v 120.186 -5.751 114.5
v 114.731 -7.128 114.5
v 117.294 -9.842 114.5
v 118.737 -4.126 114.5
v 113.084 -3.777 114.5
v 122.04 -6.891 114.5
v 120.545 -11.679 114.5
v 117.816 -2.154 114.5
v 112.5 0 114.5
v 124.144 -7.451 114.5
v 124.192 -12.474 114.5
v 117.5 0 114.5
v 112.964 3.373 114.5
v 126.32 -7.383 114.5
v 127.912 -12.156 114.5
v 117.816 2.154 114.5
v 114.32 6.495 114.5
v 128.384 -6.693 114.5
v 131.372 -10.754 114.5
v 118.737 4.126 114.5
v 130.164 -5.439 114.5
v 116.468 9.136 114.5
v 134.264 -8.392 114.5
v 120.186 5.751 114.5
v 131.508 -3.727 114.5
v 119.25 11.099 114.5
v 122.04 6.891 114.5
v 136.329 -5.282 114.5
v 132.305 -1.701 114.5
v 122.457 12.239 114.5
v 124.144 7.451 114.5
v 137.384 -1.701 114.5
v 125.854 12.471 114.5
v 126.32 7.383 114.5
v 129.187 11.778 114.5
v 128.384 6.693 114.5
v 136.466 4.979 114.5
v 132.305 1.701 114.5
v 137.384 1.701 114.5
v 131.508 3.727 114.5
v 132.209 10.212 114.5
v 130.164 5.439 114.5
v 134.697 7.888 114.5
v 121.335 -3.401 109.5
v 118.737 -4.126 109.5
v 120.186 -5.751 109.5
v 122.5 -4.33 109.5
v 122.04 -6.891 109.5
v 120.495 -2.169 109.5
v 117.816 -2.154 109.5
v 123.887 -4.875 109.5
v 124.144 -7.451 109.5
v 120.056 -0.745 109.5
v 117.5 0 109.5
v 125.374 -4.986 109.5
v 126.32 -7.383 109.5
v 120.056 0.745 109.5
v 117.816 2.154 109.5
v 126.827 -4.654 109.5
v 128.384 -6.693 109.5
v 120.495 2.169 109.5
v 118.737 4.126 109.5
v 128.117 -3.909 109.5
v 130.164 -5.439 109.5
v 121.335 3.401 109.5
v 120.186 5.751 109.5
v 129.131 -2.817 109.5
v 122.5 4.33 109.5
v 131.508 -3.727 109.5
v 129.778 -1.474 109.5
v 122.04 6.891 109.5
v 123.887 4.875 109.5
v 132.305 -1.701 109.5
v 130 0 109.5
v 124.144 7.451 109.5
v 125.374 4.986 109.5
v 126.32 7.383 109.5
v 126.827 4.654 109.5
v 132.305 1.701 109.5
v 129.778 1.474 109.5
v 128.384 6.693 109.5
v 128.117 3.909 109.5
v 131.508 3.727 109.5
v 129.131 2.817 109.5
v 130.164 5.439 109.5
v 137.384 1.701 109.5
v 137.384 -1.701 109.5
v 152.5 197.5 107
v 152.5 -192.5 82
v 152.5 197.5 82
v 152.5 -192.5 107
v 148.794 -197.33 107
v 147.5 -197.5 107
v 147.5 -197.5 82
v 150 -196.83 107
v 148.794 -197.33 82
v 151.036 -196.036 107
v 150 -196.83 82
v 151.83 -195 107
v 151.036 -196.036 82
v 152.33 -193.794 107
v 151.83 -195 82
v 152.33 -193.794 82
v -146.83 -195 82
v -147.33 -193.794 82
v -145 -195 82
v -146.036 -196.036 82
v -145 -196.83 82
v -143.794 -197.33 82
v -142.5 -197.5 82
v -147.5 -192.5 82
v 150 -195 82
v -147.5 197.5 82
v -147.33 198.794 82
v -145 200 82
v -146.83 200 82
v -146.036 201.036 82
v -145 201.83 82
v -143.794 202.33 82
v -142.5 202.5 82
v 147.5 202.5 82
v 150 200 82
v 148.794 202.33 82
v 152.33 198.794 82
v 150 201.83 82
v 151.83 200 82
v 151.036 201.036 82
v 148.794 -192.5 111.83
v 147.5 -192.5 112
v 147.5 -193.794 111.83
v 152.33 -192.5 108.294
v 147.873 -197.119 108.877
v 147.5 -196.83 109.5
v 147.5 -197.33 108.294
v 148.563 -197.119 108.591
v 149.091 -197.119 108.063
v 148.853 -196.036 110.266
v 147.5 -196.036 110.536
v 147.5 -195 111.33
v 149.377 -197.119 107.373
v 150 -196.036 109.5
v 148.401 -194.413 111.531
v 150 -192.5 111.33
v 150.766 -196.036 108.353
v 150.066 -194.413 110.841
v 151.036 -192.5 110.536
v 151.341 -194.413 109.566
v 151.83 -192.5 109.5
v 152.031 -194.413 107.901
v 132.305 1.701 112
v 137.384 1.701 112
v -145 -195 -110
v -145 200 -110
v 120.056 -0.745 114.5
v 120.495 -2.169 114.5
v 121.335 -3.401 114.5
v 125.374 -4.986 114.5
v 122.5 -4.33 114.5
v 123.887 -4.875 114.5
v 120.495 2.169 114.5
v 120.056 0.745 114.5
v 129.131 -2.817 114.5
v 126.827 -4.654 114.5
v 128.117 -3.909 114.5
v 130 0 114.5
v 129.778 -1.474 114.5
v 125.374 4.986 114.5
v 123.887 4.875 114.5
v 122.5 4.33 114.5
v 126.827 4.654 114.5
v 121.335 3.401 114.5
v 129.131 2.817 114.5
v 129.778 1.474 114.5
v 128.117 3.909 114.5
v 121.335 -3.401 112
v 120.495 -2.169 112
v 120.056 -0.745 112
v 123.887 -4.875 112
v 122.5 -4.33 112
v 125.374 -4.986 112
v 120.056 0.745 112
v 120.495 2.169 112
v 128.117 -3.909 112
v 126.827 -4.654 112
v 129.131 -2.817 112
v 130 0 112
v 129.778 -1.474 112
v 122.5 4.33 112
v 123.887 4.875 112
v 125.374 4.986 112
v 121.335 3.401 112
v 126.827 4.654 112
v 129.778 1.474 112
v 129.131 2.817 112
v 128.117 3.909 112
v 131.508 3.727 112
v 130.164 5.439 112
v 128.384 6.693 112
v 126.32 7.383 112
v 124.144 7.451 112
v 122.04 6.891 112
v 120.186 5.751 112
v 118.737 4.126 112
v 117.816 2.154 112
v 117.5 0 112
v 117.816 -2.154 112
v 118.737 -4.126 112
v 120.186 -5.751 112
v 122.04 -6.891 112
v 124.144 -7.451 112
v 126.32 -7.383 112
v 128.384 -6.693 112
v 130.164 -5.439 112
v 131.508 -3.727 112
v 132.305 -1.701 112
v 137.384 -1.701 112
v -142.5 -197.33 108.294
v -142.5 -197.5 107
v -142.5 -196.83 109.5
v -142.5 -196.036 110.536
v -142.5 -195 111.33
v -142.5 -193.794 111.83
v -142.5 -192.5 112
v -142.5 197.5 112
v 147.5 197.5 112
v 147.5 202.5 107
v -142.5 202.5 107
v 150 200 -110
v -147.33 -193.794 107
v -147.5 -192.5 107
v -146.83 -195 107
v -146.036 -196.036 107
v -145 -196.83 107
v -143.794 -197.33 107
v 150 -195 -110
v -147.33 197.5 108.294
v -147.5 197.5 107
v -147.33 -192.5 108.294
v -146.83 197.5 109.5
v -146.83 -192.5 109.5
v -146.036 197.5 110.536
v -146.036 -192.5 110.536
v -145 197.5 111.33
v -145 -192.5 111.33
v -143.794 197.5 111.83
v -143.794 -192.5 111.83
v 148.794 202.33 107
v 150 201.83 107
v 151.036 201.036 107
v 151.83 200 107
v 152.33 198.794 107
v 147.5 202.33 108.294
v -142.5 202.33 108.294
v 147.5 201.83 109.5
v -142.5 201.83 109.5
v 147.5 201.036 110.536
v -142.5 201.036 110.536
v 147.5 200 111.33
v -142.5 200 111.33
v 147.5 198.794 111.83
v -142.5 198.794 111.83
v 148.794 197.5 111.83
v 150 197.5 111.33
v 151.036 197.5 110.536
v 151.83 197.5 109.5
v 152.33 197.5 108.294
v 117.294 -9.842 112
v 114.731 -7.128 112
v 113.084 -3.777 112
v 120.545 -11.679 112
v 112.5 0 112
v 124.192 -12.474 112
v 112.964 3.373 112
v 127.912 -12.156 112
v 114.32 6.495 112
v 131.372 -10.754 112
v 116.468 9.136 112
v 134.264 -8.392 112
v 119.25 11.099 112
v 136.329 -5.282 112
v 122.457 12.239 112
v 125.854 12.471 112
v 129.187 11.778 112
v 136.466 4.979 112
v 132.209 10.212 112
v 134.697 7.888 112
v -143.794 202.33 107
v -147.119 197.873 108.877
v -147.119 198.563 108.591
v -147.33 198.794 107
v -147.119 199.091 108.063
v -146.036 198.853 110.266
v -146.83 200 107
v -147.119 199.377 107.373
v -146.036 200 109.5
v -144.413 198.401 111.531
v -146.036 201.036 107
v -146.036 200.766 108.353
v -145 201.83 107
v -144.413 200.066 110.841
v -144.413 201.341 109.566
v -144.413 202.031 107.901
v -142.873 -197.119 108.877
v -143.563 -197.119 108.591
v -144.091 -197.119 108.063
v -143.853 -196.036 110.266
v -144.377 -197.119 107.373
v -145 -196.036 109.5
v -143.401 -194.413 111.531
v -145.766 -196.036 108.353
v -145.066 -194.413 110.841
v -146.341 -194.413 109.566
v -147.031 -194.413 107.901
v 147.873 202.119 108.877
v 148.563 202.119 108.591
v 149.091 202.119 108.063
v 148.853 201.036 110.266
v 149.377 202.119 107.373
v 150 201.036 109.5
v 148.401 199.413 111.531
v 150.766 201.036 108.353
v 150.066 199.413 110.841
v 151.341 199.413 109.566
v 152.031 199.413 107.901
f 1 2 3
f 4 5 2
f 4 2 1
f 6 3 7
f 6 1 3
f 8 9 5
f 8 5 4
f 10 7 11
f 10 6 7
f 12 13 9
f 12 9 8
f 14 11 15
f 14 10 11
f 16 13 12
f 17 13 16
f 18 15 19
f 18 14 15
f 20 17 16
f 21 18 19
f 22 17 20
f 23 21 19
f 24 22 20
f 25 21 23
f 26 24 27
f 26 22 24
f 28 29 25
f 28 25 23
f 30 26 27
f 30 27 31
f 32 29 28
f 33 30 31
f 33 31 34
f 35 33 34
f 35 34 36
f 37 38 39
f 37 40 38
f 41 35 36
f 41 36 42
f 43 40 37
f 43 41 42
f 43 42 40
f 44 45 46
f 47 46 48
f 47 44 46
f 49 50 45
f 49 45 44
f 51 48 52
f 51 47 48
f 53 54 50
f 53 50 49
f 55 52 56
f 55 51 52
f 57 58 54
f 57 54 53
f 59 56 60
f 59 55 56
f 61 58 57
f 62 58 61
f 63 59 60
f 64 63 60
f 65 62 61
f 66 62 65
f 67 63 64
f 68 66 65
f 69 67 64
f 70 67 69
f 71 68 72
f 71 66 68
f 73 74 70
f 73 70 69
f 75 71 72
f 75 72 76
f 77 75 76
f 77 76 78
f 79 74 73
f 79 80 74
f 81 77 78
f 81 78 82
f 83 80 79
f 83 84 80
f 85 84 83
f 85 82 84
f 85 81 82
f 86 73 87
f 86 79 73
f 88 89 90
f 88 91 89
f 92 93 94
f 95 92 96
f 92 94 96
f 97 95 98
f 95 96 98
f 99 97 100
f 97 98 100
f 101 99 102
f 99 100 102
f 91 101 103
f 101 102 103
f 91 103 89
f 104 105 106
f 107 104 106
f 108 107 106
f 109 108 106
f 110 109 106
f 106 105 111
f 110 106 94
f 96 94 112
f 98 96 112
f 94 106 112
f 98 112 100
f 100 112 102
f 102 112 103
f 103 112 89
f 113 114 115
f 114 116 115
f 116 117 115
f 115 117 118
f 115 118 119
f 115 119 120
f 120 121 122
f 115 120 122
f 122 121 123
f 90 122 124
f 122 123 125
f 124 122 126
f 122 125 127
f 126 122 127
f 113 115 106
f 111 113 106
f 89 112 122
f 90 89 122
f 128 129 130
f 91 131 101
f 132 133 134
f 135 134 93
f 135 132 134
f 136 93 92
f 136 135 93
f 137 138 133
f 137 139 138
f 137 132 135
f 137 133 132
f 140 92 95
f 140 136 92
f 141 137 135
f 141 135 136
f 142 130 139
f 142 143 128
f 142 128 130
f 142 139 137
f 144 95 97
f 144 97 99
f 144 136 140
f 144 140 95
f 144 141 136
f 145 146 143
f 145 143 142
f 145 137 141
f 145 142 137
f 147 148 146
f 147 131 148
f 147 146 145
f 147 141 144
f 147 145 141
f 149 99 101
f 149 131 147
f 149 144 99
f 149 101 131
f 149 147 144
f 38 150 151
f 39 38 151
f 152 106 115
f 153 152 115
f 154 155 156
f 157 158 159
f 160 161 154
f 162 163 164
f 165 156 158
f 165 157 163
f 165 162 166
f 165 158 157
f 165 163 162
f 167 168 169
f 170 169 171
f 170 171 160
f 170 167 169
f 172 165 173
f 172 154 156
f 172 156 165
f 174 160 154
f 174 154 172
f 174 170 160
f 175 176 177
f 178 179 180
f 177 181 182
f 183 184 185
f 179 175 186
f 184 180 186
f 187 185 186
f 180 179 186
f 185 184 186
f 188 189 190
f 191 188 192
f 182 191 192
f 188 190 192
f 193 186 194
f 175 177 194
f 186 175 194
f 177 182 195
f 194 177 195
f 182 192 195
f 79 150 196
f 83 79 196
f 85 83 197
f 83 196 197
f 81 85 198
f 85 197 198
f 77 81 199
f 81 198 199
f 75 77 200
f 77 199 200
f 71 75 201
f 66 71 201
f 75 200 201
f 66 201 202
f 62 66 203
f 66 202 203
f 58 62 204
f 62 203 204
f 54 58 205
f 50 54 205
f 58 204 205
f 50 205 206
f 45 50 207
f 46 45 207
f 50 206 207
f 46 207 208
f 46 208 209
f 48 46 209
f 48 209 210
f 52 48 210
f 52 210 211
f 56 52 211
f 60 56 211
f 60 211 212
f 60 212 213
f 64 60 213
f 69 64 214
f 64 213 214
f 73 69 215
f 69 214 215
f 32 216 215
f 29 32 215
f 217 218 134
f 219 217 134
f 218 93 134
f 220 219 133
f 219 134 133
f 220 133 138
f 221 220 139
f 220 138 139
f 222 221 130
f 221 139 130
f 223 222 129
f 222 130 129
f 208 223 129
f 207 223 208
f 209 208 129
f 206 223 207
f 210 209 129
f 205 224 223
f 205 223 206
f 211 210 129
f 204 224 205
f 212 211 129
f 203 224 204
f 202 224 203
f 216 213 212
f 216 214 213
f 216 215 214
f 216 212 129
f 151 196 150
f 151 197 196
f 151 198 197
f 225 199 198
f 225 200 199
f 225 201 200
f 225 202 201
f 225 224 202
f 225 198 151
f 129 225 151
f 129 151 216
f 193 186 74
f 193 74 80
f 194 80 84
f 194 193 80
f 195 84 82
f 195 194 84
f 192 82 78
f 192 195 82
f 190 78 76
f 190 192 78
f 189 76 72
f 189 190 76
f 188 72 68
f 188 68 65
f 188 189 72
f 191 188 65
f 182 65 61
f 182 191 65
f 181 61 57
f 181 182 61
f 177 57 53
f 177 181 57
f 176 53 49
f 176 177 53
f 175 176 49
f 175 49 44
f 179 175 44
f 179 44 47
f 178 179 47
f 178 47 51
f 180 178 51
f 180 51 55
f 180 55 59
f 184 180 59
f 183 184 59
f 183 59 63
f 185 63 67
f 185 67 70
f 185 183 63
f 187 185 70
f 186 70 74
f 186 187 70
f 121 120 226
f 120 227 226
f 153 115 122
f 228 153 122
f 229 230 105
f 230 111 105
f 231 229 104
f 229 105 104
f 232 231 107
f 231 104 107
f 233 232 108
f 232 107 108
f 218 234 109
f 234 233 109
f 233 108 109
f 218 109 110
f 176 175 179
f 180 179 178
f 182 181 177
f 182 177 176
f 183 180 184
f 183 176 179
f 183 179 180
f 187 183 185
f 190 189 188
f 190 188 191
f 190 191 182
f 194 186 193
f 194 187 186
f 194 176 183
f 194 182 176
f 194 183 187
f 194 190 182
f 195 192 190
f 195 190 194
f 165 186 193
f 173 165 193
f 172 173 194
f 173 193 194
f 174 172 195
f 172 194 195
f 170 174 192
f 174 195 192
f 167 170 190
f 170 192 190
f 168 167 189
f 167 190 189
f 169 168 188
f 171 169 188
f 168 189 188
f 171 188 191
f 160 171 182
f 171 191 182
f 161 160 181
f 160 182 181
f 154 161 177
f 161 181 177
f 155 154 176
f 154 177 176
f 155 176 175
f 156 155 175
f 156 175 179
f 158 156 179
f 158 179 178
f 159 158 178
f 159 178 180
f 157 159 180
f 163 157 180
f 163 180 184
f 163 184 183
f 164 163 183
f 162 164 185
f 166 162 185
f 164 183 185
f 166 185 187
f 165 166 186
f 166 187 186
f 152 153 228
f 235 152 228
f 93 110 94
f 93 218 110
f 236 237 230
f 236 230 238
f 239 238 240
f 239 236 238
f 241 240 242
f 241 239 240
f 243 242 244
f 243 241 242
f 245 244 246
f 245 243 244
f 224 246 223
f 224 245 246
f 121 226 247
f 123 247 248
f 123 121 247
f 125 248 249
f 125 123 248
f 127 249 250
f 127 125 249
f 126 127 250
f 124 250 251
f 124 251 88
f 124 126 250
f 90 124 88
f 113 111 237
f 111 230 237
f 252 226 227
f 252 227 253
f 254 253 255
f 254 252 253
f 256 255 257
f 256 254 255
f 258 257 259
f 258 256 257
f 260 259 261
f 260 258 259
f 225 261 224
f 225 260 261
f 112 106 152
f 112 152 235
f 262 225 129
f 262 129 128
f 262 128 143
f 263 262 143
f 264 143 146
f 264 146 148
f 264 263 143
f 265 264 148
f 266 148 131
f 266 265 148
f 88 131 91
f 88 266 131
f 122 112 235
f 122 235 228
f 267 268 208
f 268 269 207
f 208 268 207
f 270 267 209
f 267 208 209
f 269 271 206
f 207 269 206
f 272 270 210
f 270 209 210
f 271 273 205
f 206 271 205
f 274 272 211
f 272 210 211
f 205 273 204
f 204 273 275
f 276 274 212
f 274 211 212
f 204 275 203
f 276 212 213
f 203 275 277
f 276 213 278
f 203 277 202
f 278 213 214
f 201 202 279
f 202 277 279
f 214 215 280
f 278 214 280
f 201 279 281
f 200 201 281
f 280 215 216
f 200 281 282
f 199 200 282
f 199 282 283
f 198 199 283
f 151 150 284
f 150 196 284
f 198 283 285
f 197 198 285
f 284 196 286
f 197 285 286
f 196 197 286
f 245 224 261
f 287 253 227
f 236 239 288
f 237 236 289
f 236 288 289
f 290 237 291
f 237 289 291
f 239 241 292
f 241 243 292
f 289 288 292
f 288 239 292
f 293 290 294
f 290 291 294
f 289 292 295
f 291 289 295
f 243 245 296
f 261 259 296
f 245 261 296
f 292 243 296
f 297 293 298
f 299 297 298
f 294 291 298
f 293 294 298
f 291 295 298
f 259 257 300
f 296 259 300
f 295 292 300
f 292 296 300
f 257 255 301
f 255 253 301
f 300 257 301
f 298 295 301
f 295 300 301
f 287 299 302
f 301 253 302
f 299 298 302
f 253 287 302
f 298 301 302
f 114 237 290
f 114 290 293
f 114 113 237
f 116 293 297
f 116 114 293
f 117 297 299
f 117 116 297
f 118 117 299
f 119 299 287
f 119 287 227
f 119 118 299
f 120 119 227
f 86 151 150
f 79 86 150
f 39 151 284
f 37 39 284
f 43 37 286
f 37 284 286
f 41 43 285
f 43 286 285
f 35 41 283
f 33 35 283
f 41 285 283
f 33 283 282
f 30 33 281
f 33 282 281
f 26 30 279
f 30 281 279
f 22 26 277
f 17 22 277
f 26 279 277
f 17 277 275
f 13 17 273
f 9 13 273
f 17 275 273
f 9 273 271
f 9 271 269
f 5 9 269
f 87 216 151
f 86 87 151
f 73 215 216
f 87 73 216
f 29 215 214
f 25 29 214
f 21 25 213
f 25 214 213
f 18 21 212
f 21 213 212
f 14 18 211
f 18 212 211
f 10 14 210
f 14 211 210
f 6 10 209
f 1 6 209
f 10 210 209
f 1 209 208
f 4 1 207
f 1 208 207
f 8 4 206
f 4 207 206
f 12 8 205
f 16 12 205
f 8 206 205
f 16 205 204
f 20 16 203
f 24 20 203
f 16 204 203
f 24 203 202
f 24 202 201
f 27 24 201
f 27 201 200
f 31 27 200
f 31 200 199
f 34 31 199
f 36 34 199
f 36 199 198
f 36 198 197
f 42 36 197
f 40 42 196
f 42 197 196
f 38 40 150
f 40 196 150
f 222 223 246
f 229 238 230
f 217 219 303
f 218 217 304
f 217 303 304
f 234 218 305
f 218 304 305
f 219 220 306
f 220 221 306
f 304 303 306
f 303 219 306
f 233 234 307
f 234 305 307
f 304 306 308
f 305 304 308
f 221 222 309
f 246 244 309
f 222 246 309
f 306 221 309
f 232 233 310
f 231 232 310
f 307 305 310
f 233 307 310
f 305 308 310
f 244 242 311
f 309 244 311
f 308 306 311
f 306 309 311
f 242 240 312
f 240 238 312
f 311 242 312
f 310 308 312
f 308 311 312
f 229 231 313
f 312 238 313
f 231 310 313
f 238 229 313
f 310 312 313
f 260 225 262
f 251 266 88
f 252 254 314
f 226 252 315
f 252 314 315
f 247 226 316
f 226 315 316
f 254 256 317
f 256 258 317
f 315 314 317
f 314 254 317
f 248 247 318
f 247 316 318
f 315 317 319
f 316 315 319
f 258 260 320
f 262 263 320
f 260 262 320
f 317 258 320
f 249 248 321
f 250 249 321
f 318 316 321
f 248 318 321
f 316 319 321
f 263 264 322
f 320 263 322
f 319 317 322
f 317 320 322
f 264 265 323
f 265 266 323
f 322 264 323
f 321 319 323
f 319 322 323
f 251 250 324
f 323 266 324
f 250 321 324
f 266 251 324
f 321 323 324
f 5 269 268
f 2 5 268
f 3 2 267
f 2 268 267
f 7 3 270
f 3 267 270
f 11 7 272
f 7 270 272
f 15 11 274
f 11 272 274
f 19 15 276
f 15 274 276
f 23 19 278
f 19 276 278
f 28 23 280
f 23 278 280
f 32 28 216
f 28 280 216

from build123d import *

# Parameters (mm, degrees)
F0_W     = 295
F0_H     = 395
F1_DEPTH = 110
F3_W     = 300
F3_H     = 400
F4_DEPTH = 30
F5_R     = 5
F7_DEPTH = 2.5
F6_R     = 5
F8_R     = 5
F9_DEPTH = 2.5


with BuildPart() as f1:
    # F0 (on Top) → F1 (new body, symmetric)
    with BuildSketch(Plane.XY):
        with Locations((2.5, 2.5)):
            Rectangle(F0_W, F0_H)
    extrude(amount=F1_DEPTH, both=True)

    # F3 (on offset) → F4 (join)
    with BuildSketch(Plane.XY.offset(112)):
        with Locations((2.5, 2.5)):
            Rectangle(F3_W, F3_H)
    extrude(amount=-F4_DEPTH)

    # F5
    f5_edges = [f1.edges().sort_by_distance(p)[0] for p in [
        (152.5, 2.5, 112),
        (2.5, 202.5, 112),
        (-147.5, 2.5, 112),
        (2.5, -197.5, 112),
        (152.5, 202.5, 97),
        (-147.5, 202.5, 97),
        (152.5, -197.5, 97),
        (-147.5, -197.5, 97),
    ]]
    fillet(f5_edges, radius=F5_R)

    # F8 (on face) → F9 (cut)
    with BuildSketch(Plane.XY.offset(112)):
        with BuildLine():
            Line((137.3837093672, 1.7011003229), (132.3045367883, 1.7011003229))
            ThreePointArc((132.3045367883, 1.7011003229), (117.5, 0), (132.3045367883, -1.7011003229))
            Line((132.3045367883, -1.7011003229), (137.3837093672, -1.7011003229))
            Line((137.3837093672, -1.7011003229), (137.3837093672, 1.7011003229))
        make_face()
        with Locations((125, 0)):
            Circle(F8_R, mode=Mode.SUBTRACT)
    extrude(amount=-F9_DEPTH, mode=Mode.SUBTRACT)


with BuildPart() as f7:
    # F6 (on face) → F7 (new body)
    with BuildSketch(Plane.XY.offset(112)):
        with BuildLine():
            Line((132.3045367883, 1.7011003229), (137.3837093672, 1.7011003229))
            ThreePointArc((137.3837093672, 1.7011003229), (124.1474646899, 12.4708934542), (112.5, 0))
            Line((112.5, 0), (113.0843860939, -3.777319849))
            ThreePointArc((113.0843860939, -3.777319849), (126.0641664439, -12.454619616), (137.3837093672, -1.7011003229))
            Line((137.3837093672, -1.7011003229), (132.3045367883, -1.7011003229))
            ThreePointArc((132.3045367883, -1.7011003229), (117.5, 0), (132.3045367883, 1.7011003229))
        make_face()
    extrude(amount=F7_DEPTH)


with BuildPart() as f7b:
    # F6 (on face) → F7, piece 2 (new body)
    with BuildSketch(Plane.XY.offset(112)):
        with Locations((125, 0)):
            Circle(F6_R)
    extrude(amount=F7_DEPTH)


solid = Compound([f1.part, f7.part, f7b.part])
